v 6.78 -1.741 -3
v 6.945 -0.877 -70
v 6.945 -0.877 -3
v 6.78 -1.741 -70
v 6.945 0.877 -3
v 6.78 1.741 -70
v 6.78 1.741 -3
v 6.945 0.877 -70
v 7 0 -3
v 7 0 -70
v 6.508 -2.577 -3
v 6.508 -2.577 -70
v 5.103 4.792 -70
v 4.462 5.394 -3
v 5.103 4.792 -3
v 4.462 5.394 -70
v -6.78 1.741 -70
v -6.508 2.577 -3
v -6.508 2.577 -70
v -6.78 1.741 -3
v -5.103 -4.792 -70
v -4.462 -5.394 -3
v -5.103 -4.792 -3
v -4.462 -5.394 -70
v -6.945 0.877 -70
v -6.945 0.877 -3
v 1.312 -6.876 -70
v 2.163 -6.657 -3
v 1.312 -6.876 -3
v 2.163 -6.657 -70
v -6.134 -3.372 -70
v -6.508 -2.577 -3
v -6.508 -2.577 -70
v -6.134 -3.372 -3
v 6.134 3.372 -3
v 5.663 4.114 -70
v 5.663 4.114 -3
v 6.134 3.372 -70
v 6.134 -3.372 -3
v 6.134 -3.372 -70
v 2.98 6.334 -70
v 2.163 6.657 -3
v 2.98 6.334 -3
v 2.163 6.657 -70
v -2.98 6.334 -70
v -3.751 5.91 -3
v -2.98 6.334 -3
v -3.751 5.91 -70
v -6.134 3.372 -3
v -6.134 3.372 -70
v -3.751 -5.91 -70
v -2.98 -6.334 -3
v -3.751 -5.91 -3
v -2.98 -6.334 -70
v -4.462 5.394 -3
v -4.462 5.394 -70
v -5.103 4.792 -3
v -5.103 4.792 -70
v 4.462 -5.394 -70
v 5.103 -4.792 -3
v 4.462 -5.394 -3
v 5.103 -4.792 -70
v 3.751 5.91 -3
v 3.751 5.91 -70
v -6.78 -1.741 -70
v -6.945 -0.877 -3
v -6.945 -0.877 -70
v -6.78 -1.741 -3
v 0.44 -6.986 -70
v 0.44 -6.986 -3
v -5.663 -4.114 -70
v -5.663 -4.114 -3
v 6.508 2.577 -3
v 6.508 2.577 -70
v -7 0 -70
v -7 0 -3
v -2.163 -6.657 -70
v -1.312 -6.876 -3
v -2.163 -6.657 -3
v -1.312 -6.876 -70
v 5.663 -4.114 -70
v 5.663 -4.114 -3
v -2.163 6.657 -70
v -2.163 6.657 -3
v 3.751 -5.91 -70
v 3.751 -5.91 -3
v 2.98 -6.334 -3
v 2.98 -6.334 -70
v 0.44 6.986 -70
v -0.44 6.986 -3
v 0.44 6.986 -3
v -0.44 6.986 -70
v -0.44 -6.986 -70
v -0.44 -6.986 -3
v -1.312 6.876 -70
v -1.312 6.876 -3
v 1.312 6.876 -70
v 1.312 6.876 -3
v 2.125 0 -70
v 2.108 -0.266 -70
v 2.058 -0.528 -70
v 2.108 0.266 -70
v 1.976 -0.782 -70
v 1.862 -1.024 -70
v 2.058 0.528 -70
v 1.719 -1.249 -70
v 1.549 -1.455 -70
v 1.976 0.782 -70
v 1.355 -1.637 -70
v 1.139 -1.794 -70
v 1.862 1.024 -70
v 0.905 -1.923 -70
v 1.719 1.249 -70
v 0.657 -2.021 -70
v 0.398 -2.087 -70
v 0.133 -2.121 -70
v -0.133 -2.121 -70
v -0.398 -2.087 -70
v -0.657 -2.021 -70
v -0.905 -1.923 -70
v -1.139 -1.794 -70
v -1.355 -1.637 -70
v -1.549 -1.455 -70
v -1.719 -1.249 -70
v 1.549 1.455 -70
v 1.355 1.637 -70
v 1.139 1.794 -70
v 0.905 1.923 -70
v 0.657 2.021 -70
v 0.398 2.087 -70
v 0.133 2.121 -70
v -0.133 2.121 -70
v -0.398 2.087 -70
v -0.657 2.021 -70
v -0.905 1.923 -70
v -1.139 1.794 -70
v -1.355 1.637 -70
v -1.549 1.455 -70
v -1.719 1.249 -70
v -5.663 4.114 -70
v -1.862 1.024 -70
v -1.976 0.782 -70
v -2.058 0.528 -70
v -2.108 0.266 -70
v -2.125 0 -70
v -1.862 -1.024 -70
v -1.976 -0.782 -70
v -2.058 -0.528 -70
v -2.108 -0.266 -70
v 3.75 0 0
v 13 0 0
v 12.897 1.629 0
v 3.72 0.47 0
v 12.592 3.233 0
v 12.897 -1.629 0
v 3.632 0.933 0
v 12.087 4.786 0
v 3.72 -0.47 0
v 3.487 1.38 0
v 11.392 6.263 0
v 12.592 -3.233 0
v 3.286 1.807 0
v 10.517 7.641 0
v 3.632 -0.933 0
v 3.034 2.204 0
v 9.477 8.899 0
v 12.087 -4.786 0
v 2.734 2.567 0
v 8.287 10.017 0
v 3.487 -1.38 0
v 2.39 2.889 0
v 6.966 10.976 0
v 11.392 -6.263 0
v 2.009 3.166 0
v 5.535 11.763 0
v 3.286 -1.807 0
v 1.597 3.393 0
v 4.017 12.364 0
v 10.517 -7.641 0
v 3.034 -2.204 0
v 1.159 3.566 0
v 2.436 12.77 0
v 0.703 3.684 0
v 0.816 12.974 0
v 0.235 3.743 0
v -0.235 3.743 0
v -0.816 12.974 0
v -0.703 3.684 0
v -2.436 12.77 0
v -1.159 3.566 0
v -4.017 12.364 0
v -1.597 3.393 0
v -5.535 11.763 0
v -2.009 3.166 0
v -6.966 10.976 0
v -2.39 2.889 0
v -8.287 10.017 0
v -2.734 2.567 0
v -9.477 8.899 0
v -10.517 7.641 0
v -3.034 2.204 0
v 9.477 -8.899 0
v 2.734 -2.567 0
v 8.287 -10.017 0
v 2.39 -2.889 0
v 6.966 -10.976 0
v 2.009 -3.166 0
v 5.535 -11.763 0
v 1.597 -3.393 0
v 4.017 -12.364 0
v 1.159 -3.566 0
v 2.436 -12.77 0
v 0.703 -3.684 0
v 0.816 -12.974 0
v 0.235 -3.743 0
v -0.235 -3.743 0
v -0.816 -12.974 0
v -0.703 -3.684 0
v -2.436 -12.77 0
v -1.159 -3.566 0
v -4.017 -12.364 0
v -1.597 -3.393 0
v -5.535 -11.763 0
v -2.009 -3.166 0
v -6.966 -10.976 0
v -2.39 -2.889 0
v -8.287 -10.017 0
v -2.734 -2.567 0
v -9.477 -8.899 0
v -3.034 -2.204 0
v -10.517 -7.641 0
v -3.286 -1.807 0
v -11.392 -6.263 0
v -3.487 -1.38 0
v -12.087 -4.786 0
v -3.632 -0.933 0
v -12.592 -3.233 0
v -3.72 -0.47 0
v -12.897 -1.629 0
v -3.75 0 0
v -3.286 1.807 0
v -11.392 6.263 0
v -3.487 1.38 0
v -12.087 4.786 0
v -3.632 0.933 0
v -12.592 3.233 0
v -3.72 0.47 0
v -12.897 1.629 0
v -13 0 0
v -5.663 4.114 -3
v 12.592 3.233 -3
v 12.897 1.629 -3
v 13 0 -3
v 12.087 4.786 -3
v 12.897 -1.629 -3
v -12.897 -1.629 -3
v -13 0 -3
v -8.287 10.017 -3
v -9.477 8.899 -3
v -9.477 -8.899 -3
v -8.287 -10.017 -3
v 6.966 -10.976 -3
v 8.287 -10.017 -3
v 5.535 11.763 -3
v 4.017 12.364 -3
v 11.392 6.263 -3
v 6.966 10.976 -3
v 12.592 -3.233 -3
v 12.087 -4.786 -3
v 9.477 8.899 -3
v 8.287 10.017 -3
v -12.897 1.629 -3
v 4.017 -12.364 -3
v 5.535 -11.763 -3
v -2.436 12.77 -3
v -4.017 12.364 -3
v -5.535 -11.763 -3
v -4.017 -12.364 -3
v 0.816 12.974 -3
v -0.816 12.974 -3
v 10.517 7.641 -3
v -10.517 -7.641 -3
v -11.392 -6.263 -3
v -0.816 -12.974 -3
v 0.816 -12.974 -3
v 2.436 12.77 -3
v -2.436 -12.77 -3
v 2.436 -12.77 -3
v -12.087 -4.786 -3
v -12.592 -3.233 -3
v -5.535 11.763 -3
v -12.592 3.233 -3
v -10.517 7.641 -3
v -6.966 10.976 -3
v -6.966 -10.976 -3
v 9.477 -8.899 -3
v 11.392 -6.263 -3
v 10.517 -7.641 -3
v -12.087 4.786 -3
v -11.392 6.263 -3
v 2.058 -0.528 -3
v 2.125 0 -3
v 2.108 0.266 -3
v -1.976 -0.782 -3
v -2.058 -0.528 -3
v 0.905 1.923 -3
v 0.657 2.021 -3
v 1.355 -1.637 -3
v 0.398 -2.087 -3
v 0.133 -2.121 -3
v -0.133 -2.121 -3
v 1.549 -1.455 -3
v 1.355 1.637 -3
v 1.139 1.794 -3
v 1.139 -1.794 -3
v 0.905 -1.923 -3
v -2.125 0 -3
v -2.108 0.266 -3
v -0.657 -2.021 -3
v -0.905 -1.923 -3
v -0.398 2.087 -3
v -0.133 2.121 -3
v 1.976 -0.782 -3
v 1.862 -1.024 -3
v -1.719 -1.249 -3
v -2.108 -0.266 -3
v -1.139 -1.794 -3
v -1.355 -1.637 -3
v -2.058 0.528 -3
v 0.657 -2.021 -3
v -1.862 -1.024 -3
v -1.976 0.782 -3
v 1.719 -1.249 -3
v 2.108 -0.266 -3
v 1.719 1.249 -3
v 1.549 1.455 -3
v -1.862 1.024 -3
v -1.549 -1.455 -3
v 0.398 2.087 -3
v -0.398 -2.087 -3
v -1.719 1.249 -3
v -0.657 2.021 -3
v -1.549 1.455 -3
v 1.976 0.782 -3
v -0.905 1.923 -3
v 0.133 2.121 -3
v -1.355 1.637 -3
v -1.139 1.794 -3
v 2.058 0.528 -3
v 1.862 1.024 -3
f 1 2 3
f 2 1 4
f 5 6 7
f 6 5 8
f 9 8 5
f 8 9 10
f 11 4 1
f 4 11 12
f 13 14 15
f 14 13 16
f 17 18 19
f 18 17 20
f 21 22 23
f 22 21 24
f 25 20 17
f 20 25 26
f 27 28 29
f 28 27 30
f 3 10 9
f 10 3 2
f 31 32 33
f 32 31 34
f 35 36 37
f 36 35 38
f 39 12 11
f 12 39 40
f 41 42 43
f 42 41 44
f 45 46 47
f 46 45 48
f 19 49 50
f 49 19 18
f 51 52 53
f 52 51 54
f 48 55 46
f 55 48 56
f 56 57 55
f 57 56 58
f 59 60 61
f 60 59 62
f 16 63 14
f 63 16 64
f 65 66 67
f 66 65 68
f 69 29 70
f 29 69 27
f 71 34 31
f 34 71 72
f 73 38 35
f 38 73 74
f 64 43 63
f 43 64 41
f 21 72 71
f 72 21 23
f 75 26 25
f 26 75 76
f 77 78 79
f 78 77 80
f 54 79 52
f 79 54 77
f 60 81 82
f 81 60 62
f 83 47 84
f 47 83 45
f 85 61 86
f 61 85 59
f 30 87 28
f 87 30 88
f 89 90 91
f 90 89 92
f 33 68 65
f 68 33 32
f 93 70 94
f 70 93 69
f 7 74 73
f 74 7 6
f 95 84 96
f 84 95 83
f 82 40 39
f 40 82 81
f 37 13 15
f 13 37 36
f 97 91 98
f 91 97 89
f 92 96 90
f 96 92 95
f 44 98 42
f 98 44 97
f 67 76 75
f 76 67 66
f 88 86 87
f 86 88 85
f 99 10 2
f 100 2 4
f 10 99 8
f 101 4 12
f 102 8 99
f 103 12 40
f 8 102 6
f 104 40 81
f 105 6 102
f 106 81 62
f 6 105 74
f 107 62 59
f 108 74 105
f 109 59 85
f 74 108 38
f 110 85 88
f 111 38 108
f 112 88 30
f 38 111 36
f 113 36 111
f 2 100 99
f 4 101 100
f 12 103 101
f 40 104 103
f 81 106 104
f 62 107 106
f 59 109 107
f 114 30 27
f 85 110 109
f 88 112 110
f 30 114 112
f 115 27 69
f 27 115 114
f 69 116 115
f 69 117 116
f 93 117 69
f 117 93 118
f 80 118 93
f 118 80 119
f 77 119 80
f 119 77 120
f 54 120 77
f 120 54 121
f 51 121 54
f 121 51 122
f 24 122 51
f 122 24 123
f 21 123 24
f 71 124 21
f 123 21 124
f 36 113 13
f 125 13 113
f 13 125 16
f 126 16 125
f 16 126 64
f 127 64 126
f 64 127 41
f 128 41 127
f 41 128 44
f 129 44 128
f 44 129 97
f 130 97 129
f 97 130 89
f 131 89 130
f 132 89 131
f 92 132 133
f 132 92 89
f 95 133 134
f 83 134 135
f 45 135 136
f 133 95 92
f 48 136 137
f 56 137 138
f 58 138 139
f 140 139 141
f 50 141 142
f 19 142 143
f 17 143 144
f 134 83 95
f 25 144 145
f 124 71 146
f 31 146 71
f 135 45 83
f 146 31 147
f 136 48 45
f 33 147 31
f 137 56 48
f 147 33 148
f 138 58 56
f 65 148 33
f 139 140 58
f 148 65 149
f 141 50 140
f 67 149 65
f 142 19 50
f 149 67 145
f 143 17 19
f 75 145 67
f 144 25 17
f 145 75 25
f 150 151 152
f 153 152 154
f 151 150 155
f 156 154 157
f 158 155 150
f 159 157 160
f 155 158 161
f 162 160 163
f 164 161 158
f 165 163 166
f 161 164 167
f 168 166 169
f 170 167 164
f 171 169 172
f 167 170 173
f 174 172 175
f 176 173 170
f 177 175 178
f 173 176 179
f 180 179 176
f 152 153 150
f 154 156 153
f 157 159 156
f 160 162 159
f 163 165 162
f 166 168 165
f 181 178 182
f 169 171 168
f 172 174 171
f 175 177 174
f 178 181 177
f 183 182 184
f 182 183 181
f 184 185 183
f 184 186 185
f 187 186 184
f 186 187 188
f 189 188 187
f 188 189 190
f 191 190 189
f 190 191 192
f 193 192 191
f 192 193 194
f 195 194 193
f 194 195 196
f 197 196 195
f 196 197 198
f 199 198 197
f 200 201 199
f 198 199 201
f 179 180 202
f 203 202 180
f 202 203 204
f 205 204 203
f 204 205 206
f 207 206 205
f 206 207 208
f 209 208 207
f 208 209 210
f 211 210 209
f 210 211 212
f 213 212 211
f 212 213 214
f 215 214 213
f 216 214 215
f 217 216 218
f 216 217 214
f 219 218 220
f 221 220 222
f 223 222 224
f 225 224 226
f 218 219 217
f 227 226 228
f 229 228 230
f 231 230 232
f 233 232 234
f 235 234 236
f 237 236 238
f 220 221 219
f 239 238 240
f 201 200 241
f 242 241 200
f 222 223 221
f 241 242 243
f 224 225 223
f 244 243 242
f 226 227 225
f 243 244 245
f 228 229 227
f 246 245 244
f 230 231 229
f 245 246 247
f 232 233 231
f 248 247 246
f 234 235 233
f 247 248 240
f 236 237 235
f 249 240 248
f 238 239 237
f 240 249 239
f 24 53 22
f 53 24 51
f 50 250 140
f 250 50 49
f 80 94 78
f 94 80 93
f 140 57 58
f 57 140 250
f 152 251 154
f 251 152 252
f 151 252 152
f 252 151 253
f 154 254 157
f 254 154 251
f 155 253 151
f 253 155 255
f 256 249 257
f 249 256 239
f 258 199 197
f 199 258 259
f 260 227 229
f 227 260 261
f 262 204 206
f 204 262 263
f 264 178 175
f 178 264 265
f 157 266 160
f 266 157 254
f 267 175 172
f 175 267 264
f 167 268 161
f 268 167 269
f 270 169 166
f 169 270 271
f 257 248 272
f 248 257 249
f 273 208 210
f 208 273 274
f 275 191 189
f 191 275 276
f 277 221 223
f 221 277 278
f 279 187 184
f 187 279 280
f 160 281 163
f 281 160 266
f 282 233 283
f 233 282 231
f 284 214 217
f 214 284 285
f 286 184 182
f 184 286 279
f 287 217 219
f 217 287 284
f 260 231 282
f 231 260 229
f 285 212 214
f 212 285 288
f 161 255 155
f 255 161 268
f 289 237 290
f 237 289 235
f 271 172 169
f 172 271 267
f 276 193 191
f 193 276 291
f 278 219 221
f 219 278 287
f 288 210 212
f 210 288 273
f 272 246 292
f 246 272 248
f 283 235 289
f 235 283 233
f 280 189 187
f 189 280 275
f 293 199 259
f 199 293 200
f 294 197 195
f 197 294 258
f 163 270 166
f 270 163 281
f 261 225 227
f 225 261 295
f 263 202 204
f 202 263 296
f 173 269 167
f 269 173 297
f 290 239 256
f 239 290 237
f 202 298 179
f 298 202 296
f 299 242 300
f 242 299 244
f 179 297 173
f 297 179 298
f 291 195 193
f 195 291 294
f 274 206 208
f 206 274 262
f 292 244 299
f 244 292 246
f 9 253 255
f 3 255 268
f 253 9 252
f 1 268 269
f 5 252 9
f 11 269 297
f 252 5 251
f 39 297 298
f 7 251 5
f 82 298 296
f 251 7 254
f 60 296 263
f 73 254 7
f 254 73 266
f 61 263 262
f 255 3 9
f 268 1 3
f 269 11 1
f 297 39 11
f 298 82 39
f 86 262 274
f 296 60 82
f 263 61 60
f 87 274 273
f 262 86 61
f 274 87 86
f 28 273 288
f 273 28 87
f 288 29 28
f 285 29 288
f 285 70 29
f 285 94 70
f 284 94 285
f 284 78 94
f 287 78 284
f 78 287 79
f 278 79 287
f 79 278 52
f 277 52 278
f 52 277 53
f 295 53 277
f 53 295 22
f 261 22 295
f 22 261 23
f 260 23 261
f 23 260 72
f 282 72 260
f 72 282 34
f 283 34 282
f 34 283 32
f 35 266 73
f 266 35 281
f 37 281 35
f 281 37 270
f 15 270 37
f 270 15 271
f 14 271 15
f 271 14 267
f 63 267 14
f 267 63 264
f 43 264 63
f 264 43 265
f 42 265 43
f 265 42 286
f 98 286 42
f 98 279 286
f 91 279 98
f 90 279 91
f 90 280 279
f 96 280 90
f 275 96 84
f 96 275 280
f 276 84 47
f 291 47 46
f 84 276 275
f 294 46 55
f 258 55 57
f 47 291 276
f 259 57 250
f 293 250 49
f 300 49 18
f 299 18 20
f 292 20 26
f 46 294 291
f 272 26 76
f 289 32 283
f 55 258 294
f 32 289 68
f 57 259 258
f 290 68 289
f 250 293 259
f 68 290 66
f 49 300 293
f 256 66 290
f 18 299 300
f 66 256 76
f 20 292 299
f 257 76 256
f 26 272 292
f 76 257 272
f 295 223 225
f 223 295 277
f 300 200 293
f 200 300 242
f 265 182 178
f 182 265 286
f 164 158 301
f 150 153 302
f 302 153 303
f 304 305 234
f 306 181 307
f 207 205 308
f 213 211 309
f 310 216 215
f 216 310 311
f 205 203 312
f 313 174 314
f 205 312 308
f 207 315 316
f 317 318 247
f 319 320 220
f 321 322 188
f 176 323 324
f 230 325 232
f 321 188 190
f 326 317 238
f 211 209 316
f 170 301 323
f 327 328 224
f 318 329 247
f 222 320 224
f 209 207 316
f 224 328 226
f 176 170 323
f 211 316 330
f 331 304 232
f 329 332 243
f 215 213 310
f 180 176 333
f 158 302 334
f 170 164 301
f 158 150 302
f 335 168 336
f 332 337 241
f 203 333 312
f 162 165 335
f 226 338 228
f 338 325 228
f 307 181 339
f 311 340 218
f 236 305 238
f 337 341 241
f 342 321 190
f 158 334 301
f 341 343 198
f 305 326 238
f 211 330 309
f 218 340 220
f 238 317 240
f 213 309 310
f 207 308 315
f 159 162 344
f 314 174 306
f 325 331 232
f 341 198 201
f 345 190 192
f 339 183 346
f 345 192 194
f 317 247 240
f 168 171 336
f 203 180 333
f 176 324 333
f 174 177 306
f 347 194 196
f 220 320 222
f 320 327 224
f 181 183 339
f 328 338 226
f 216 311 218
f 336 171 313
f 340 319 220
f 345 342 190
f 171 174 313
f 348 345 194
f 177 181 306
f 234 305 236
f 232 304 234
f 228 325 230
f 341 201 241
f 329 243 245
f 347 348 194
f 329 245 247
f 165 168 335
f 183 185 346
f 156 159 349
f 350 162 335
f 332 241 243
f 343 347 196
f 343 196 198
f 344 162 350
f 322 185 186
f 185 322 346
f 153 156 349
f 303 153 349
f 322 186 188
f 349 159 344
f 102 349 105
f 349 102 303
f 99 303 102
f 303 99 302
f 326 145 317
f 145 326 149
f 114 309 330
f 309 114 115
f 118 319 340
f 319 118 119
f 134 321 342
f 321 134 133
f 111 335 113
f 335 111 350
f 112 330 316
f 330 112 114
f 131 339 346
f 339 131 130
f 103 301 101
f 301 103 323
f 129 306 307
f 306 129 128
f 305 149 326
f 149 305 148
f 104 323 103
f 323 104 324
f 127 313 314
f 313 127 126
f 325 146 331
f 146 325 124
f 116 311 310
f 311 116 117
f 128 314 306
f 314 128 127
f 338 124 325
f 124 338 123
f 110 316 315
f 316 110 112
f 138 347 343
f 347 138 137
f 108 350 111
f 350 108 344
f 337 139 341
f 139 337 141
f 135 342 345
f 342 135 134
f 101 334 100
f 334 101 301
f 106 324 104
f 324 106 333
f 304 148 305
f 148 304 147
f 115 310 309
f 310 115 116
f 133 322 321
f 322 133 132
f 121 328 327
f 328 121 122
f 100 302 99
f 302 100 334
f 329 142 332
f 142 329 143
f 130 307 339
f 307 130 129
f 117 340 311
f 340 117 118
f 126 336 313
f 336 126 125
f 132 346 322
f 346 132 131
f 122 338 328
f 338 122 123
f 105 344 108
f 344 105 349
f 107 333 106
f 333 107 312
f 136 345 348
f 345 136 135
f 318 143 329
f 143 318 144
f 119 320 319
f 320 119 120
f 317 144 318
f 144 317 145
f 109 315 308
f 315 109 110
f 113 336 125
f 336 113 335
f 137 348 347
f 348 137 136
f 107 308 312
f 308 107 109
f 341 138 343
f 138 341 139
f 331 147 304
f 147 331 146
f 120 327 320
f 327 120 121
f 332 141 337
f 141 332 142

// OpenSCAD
$fn = 50;


difference() {
	union() {
		translate(v = [0, 0, -70.0000000000]) {
			cylinder(h = 70, r = 7.0000000000);
		}
		translate(v = [0, 0, -3.0000000000]) {
			cylinder(h = 3, r = 13.0000000000);
		}
	}
	union() {
		translate(v = [0, 0, 0]) {
			rotate(a = [0, 0, 0]) {
				difference() {
					union() {
						#translate(v = [0, 0, -70.0000000000]) {
							cylinder(h = 70, r = 2.0000000000);
						}
						#translate(v = [0, 0, -3]) {
							cylinder(h = 3, r = 7.0000000000, r1 = 2.1250000000, r2 = 3.7500000000);
						}
						#translate(v = [0, 0, -70.0000000000]) {
							cylinder(h = 70, r = 2.1250000000);
						}
						#translate(v = [0, 0, -70.0000000000]) {
							cylinder(h = 70, r = 2.0000000000);
						}
					}
					union();
				}
			}
		}
	}
}
